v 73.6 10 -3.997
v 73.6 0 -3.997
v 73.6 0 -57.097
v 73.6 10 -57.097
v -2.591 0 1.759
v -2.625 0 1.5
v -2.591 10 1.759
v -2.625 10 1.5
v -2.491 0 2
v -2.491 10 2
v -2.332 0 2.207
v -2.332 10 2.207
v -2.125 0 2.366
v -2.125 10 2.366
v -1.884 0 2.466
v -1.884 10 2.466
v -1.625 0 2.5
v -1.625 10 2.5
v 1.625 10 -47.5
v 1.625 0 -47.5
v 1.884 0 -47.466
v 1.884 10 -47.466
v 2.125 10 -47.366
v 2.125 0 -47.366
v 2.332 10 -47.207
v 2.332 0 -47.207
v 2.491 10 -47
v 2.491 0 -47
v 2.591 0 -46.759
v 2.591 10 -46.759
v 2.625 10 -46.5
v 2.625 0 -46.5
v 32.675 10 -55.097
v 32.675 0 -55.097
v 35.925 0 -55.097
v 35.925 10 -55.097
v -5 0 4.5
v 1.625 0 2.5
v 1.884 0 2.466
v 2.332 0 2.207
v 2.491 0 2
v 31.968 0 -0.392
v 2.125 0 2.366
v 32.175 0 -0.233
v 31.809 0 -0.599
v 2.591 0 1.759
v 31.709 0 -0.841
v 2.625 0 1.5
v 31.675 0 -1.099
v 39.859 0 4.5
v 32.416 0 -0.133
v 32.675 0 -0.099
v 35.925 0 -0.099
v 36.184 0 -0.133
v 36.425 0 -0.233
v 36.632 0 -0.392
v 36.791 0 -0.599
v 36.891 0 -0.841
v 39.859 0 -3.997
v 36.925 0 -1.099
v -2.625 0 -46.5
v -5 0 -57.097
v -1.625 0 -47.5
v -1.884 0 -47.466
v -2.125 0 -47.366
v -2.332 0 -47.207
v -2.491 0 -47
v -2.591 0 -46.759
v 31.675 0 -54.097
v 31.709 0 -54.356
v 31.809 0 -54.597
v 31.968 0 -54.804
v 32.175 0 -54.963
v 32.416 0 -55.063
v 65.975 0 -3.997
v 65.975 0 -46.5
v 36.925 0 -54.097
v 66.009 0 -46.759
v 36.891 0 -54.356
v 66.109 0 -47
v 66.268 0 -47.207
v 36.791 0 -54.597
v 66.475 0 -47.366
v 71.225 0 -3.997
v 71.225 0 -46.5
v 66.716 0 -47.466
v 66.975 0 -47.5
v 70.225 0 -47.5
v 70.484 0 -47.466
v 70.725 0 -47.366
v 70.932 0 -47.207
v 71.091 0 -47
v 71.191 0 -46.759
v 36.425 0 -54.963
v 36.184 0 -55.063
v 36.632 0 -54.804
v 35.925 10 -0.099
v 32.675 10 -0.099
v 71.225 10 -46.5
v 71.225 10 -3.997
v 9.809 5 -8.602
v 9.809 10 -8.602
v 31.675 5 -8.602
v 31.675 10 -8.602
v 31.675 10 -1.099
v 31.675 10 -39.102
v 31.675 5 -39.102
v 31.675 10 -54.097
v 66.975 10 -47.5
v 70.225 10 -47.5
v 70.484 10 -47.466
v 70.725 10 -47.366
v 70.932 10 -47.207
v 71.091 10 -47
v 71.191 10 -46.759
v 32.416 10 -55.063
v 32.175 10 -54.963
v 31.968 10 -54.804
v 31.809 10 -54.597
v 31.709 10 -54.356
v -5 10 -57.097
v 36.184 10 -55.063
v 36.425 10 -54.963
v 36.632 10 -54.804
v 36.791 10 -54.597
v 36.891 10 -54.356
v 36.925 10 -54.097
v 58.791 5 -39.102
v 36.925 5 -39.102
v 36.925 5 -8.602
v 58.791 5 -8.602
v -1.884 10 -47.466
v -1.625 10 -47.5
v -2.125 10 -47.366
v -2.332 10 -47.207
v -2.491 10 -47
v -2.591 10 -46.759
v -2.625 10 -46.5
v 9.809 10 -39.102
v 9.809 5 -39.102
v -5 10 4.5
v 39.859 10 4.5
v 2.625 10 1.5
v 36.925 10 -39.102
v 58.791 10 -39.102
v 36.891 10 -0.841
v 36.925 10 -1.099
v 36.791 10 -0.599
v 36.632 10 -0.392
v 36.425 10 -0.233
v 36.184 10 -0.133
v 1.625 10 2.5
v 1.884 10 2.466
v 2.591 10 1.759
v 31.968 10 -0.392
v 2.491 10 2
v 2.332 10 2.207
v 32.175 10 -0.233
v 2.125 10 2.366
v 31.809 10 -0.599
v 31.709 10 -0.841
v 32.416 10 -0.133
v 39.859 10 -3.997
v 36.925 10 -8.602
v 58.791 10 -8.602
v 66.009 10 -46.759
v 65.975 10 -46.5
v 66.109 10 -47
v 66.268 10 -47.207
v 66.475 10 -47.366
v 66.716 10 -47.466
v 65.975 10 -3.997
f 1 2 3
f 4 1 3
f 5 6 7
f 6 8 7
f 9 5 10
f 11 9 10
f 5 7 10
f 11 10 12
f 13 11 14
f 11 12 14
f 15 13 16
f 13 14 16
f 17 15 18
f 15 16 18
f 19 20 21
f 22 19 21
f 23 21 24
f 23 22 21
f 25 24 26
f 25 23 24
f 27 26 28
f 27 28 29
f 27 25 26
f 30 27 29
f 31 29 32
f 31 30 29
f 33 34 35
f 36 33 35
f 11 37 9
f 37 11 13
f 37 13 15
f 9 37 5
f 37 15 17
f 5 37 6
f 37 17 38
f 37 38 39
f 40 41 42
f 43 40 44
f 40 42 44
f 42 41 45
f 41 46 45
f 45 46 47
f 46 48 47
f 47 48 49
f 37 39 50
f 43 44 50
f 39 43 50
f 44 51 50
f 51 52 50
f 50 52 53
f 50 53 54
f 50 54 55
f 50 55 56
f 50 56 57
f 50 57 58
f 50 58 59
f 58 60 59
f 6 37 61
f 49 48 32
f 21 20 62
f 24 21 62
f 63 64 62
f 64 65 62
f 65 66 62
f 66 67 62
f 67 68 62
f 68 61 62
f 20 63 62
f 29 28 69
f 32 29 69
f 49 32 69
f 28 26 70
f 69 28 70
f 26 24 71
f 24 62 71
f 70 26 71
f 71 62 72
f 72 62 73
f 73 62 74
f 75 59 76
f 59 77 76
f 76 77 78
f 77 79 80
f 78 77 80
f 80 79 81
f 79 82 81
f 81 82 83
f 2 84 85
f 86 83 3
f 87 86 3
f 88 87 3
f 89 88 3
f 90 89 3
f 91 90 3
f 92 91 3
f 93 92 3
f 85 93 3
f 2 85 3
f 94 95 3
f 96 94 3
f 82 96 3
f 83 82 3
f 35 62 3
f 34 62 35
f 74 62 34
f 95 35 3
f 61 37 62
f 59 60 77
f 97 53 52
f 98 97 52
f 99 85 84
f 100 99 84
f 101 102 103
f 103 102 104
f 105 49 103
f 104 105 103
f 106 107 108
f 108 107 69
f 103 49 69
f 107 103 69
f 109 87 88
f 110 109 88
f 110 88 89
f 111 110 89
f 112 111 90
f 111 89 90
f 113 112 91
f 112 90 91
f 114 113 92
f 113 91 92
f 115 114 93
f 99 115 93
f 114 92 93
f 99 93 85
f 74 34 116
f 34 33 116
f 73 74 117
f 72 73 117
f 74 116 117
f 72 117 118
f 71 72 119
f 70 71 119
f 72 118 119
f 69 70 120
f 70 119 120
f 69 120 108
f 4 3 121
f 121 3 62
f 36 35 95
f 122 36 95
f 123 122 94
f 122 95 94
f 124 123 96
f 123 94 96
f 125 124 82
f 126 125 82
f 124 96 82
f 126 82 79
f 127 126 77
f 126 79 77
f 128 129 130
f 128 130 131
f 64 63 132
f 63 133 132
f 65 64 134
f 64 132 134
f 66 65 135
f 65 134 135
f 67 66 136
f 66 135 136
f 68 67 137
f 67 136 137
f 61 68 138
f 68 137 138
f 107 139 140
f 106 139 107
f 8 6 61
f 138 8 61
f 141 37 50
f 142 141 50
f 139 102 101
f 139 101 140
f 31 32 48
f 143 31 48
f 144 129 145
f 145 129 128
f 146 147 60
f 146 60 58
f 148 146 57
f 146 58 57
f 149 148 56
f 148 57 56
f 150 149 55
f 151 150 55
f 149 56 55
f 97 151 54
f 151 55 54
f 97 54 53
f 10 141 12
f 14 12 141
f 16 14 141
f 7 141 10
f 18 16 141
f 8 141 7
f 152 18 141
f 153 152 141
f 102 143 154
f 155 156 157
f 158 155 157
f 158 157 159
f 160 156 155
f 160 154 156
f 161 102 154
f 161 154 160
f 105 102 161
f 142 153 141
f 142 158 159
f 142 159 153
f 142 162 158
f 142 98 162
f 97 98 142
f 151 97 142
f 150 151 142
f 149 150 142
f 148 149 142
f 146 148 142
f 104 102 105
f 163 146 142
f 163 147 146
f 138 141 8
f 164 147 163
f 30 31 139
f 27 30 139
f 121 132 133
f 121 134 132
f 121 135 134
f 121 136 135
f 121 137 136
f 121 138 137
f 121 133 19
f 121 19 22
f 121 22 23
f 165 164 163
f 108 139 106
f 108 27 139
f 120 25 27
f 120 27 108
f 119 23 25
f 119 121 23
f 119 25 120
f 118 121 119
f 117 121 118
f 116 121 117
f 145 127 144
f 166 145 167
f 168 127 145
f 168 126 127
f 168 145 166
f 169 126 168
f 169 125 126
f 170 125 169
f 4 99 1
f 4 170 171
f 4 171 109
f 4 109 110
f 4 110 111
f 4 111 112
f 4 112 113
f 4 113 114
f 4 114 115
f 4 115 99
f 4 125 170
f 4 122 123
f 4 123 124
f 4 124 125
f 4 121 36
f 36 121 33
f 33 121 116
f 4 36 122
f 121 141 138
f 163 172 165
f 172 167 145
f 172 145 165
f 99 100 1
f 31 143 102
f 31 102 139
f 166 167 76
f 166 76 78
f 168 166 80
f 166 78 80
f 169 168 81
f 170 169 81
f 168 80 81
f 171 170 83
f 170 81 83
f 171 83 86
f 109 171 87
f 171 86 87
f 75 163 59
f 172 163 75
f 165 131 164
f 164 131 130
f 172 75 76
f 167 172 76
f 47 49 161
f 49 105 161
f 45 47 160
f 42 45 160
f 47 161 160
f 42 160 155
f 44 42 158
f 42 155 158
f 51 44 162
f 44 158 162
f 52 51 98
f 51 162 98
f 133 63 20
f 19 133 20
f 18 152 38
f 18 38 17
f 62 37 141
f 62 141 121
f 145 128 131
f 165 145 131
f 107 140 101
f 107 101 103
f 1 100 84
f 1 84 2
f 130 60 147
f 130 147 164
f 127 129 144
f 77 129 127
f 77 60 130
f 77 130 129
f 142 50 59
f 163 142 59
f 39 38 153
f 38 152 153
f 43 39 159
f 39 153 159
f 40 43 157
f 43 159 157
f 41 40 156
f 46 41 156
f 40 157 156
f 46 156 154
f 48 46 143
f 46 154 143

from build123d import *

# Parameters (mm, degrees)
BOSS_EXTRUDE1_DEPTH = 10
FILLET1_R           = 1
SKETCH2_W           = 21.86553483
SKETCH2_H           = 30.5
CUT_EXTRUDE1_DEPTH  = 5
MIRROR1_DEPTH       = 10
MIRROR1_2_OUTLINE_W = 21.86553483
MIRROR1_2_OUTLINE_H = 30.5
MIRROR1_2_DEPTH     = 5
SKETCH6_W           = 43.680332617
SKETCH6_H           = 16.249834628
CUT_EXTRUDE2_DEPTH  = 10


# Read off the part's stored shape, not the designer's step: Mirror1
with BuildPart() as part:
    # Sketch1 → Boss-Extrude1 (new body)
    with BuildSketch(Plane(origin=(0, 0, 0), x_dir=(1, 0, 0), z_dir=(0, 1, 0))):
        Polygon((-5, 57.097150921), (34.3, 57.097150921), (34.3, 55.097150921), (31.675, 55.097150921), (31.675, 52.597150921), (31.675, 2.599340873), (31.675, 0.099340873), (34.3, 0.099340873), (34.3, -4.5), (-5, -4.5), align=None)
        Polygon((-2.625, 45), (-2.625, 0), (-2.625, -2.5), (0, -2.5), (2.625, -2.5), (2.625, 0), (2.625, 45), (2.625, 47.5), (0, 47.5), (-2.625, 47.5), align=None, mode=Mode.SUBTRACT)
    extrude(amount=BOSS_EXTRUDE1_DEPTH)

    # Fillet1
    fillet1_edges = [part.edges().sort_by_distance(p)[0] for p in [
        (31.675, 5, -55.097150921),
        (31.675, 5, -0.099340873),
        (-2.625, 5, -47.5),
        (-2.625, 5, 2.5),
        (2.625, 5, 2.5),
        (2.625, 5, -47.5),
    ]]
    fillet(fillet1_edges, radius=FILLET1_R)

    # Sketch2 → Cut-Extrude1 (cut)
    with BuildSketch(Plane(origin=(0, 10, 0), x_dir=(1, 0, 0), z_dir=(0, 1, 0))):
        with Locations((20.742232585, 23.8519351)):
            Rectangle(SKETCH2_W, SKETCH2_H)
    extrude(amount=-CUT_EXTRUDE1_DEPTH, mode=Mode.SUBTRACT)

    # Mirror1 outline → Mirror1 (add)
    with BuildSketch(Plane(origin=(0, 0, 0), x_dir=(1, 0, 0), z_dir=(0, 1, 0))):
        with BuildLine():
            ThreePointArc((35.925, 55.097150921), (36.632106781, 54.804257702), (36.925, 54.097150921))
            Line((36.925, 54.097150921), (36.925, 39.1019351))
            Line((36.925, 39.1019351), (58.79053483, 39.1019351))
            Line((58.79053483, 39.1019351), (58.79053483, 8.6019351))
            Line((58.79053483, 8.6019351), (36.925, 8.6019351))
            Line((36.925, 8.6019351), (36.925, 1.099340873))
            ThreePointArc((36.925, 1.099340873), (36.632106781, 0.392234092), (35.925, 0.099340873))
            Line((35.925, 0.099340873), (34.3, 0.099340873))
            Line((34.3, 0.099340873), (34.3, -4.5))
            Line((34.3, -4.5), (73.6, -4.5))
            Line((73.6, -4.5), (73.6, 57.097150921))
            Line((73.6, 57.097150921), (34.3, 57.097150921))
            Line((34.3, 57.097150921), (34.3, 55.097150921))
            Line((34.3, 55.097150921), (35.925, 55.097150921))
        make_face()
        with BuildLine():
            Line((70.225, -2.5), (66.975, -2.5))
            ThreePointArc((66.975, -2.5), (66.267893219, -2.207106781), (65.975, -1.5))
            Line((65.975, -1.5), (65.975, 46.5))
            ThreePointArc((65.975, 46.5), (66.267893219, 47.207106781), (66.975, 47.5))
            Line((66.975, 47.5), (70.225, 47.5))
            ThreePointArc((70.225, 47.5), (70.932106781, 47.207106781), (71.225, 46.5))
            Line((71.225, 46.5), (71.225, -1.5))
            ThreePointArc((71.225, -1.5), (70.932106781, -2.207106781), (70.225, -2.5))
        make_face(mode=Mode.SUBTRACT)
    extrude(amount=MIRROR1_DEPTH)

    # Mirror1 2 outline → Mirror1 2 (add)
    with BuildSketch(Plane(origin=(0, 0, 0), x_dir=(1, 0, 0), z_dir=(0, 1, 0))):
        with Locations((47.857767415, 23.8519351)):
            Rectangle(MIRROR1_2_OUTLINE_W, MIRROR1_2_OUTLINE_H)
    extrude(amount=MIRROR1_2_DEPTH)

    # Sketch6 → Cut-Extrude2 (cut)
    with BuildSketch(Plane(origin=(0, 10, 0), x_dir=(1, 0, 0), z_dir=(0, 1, 0))):
        with Locations((61.699631479, -4.127511542)):
            Rectangle(SKETCH6_W, SKETCH6_H)
    extrude(amount=-CUT_EXTRUDE2_DEPTH, mode=Mode.SUBTRACT)


solid = part.part
